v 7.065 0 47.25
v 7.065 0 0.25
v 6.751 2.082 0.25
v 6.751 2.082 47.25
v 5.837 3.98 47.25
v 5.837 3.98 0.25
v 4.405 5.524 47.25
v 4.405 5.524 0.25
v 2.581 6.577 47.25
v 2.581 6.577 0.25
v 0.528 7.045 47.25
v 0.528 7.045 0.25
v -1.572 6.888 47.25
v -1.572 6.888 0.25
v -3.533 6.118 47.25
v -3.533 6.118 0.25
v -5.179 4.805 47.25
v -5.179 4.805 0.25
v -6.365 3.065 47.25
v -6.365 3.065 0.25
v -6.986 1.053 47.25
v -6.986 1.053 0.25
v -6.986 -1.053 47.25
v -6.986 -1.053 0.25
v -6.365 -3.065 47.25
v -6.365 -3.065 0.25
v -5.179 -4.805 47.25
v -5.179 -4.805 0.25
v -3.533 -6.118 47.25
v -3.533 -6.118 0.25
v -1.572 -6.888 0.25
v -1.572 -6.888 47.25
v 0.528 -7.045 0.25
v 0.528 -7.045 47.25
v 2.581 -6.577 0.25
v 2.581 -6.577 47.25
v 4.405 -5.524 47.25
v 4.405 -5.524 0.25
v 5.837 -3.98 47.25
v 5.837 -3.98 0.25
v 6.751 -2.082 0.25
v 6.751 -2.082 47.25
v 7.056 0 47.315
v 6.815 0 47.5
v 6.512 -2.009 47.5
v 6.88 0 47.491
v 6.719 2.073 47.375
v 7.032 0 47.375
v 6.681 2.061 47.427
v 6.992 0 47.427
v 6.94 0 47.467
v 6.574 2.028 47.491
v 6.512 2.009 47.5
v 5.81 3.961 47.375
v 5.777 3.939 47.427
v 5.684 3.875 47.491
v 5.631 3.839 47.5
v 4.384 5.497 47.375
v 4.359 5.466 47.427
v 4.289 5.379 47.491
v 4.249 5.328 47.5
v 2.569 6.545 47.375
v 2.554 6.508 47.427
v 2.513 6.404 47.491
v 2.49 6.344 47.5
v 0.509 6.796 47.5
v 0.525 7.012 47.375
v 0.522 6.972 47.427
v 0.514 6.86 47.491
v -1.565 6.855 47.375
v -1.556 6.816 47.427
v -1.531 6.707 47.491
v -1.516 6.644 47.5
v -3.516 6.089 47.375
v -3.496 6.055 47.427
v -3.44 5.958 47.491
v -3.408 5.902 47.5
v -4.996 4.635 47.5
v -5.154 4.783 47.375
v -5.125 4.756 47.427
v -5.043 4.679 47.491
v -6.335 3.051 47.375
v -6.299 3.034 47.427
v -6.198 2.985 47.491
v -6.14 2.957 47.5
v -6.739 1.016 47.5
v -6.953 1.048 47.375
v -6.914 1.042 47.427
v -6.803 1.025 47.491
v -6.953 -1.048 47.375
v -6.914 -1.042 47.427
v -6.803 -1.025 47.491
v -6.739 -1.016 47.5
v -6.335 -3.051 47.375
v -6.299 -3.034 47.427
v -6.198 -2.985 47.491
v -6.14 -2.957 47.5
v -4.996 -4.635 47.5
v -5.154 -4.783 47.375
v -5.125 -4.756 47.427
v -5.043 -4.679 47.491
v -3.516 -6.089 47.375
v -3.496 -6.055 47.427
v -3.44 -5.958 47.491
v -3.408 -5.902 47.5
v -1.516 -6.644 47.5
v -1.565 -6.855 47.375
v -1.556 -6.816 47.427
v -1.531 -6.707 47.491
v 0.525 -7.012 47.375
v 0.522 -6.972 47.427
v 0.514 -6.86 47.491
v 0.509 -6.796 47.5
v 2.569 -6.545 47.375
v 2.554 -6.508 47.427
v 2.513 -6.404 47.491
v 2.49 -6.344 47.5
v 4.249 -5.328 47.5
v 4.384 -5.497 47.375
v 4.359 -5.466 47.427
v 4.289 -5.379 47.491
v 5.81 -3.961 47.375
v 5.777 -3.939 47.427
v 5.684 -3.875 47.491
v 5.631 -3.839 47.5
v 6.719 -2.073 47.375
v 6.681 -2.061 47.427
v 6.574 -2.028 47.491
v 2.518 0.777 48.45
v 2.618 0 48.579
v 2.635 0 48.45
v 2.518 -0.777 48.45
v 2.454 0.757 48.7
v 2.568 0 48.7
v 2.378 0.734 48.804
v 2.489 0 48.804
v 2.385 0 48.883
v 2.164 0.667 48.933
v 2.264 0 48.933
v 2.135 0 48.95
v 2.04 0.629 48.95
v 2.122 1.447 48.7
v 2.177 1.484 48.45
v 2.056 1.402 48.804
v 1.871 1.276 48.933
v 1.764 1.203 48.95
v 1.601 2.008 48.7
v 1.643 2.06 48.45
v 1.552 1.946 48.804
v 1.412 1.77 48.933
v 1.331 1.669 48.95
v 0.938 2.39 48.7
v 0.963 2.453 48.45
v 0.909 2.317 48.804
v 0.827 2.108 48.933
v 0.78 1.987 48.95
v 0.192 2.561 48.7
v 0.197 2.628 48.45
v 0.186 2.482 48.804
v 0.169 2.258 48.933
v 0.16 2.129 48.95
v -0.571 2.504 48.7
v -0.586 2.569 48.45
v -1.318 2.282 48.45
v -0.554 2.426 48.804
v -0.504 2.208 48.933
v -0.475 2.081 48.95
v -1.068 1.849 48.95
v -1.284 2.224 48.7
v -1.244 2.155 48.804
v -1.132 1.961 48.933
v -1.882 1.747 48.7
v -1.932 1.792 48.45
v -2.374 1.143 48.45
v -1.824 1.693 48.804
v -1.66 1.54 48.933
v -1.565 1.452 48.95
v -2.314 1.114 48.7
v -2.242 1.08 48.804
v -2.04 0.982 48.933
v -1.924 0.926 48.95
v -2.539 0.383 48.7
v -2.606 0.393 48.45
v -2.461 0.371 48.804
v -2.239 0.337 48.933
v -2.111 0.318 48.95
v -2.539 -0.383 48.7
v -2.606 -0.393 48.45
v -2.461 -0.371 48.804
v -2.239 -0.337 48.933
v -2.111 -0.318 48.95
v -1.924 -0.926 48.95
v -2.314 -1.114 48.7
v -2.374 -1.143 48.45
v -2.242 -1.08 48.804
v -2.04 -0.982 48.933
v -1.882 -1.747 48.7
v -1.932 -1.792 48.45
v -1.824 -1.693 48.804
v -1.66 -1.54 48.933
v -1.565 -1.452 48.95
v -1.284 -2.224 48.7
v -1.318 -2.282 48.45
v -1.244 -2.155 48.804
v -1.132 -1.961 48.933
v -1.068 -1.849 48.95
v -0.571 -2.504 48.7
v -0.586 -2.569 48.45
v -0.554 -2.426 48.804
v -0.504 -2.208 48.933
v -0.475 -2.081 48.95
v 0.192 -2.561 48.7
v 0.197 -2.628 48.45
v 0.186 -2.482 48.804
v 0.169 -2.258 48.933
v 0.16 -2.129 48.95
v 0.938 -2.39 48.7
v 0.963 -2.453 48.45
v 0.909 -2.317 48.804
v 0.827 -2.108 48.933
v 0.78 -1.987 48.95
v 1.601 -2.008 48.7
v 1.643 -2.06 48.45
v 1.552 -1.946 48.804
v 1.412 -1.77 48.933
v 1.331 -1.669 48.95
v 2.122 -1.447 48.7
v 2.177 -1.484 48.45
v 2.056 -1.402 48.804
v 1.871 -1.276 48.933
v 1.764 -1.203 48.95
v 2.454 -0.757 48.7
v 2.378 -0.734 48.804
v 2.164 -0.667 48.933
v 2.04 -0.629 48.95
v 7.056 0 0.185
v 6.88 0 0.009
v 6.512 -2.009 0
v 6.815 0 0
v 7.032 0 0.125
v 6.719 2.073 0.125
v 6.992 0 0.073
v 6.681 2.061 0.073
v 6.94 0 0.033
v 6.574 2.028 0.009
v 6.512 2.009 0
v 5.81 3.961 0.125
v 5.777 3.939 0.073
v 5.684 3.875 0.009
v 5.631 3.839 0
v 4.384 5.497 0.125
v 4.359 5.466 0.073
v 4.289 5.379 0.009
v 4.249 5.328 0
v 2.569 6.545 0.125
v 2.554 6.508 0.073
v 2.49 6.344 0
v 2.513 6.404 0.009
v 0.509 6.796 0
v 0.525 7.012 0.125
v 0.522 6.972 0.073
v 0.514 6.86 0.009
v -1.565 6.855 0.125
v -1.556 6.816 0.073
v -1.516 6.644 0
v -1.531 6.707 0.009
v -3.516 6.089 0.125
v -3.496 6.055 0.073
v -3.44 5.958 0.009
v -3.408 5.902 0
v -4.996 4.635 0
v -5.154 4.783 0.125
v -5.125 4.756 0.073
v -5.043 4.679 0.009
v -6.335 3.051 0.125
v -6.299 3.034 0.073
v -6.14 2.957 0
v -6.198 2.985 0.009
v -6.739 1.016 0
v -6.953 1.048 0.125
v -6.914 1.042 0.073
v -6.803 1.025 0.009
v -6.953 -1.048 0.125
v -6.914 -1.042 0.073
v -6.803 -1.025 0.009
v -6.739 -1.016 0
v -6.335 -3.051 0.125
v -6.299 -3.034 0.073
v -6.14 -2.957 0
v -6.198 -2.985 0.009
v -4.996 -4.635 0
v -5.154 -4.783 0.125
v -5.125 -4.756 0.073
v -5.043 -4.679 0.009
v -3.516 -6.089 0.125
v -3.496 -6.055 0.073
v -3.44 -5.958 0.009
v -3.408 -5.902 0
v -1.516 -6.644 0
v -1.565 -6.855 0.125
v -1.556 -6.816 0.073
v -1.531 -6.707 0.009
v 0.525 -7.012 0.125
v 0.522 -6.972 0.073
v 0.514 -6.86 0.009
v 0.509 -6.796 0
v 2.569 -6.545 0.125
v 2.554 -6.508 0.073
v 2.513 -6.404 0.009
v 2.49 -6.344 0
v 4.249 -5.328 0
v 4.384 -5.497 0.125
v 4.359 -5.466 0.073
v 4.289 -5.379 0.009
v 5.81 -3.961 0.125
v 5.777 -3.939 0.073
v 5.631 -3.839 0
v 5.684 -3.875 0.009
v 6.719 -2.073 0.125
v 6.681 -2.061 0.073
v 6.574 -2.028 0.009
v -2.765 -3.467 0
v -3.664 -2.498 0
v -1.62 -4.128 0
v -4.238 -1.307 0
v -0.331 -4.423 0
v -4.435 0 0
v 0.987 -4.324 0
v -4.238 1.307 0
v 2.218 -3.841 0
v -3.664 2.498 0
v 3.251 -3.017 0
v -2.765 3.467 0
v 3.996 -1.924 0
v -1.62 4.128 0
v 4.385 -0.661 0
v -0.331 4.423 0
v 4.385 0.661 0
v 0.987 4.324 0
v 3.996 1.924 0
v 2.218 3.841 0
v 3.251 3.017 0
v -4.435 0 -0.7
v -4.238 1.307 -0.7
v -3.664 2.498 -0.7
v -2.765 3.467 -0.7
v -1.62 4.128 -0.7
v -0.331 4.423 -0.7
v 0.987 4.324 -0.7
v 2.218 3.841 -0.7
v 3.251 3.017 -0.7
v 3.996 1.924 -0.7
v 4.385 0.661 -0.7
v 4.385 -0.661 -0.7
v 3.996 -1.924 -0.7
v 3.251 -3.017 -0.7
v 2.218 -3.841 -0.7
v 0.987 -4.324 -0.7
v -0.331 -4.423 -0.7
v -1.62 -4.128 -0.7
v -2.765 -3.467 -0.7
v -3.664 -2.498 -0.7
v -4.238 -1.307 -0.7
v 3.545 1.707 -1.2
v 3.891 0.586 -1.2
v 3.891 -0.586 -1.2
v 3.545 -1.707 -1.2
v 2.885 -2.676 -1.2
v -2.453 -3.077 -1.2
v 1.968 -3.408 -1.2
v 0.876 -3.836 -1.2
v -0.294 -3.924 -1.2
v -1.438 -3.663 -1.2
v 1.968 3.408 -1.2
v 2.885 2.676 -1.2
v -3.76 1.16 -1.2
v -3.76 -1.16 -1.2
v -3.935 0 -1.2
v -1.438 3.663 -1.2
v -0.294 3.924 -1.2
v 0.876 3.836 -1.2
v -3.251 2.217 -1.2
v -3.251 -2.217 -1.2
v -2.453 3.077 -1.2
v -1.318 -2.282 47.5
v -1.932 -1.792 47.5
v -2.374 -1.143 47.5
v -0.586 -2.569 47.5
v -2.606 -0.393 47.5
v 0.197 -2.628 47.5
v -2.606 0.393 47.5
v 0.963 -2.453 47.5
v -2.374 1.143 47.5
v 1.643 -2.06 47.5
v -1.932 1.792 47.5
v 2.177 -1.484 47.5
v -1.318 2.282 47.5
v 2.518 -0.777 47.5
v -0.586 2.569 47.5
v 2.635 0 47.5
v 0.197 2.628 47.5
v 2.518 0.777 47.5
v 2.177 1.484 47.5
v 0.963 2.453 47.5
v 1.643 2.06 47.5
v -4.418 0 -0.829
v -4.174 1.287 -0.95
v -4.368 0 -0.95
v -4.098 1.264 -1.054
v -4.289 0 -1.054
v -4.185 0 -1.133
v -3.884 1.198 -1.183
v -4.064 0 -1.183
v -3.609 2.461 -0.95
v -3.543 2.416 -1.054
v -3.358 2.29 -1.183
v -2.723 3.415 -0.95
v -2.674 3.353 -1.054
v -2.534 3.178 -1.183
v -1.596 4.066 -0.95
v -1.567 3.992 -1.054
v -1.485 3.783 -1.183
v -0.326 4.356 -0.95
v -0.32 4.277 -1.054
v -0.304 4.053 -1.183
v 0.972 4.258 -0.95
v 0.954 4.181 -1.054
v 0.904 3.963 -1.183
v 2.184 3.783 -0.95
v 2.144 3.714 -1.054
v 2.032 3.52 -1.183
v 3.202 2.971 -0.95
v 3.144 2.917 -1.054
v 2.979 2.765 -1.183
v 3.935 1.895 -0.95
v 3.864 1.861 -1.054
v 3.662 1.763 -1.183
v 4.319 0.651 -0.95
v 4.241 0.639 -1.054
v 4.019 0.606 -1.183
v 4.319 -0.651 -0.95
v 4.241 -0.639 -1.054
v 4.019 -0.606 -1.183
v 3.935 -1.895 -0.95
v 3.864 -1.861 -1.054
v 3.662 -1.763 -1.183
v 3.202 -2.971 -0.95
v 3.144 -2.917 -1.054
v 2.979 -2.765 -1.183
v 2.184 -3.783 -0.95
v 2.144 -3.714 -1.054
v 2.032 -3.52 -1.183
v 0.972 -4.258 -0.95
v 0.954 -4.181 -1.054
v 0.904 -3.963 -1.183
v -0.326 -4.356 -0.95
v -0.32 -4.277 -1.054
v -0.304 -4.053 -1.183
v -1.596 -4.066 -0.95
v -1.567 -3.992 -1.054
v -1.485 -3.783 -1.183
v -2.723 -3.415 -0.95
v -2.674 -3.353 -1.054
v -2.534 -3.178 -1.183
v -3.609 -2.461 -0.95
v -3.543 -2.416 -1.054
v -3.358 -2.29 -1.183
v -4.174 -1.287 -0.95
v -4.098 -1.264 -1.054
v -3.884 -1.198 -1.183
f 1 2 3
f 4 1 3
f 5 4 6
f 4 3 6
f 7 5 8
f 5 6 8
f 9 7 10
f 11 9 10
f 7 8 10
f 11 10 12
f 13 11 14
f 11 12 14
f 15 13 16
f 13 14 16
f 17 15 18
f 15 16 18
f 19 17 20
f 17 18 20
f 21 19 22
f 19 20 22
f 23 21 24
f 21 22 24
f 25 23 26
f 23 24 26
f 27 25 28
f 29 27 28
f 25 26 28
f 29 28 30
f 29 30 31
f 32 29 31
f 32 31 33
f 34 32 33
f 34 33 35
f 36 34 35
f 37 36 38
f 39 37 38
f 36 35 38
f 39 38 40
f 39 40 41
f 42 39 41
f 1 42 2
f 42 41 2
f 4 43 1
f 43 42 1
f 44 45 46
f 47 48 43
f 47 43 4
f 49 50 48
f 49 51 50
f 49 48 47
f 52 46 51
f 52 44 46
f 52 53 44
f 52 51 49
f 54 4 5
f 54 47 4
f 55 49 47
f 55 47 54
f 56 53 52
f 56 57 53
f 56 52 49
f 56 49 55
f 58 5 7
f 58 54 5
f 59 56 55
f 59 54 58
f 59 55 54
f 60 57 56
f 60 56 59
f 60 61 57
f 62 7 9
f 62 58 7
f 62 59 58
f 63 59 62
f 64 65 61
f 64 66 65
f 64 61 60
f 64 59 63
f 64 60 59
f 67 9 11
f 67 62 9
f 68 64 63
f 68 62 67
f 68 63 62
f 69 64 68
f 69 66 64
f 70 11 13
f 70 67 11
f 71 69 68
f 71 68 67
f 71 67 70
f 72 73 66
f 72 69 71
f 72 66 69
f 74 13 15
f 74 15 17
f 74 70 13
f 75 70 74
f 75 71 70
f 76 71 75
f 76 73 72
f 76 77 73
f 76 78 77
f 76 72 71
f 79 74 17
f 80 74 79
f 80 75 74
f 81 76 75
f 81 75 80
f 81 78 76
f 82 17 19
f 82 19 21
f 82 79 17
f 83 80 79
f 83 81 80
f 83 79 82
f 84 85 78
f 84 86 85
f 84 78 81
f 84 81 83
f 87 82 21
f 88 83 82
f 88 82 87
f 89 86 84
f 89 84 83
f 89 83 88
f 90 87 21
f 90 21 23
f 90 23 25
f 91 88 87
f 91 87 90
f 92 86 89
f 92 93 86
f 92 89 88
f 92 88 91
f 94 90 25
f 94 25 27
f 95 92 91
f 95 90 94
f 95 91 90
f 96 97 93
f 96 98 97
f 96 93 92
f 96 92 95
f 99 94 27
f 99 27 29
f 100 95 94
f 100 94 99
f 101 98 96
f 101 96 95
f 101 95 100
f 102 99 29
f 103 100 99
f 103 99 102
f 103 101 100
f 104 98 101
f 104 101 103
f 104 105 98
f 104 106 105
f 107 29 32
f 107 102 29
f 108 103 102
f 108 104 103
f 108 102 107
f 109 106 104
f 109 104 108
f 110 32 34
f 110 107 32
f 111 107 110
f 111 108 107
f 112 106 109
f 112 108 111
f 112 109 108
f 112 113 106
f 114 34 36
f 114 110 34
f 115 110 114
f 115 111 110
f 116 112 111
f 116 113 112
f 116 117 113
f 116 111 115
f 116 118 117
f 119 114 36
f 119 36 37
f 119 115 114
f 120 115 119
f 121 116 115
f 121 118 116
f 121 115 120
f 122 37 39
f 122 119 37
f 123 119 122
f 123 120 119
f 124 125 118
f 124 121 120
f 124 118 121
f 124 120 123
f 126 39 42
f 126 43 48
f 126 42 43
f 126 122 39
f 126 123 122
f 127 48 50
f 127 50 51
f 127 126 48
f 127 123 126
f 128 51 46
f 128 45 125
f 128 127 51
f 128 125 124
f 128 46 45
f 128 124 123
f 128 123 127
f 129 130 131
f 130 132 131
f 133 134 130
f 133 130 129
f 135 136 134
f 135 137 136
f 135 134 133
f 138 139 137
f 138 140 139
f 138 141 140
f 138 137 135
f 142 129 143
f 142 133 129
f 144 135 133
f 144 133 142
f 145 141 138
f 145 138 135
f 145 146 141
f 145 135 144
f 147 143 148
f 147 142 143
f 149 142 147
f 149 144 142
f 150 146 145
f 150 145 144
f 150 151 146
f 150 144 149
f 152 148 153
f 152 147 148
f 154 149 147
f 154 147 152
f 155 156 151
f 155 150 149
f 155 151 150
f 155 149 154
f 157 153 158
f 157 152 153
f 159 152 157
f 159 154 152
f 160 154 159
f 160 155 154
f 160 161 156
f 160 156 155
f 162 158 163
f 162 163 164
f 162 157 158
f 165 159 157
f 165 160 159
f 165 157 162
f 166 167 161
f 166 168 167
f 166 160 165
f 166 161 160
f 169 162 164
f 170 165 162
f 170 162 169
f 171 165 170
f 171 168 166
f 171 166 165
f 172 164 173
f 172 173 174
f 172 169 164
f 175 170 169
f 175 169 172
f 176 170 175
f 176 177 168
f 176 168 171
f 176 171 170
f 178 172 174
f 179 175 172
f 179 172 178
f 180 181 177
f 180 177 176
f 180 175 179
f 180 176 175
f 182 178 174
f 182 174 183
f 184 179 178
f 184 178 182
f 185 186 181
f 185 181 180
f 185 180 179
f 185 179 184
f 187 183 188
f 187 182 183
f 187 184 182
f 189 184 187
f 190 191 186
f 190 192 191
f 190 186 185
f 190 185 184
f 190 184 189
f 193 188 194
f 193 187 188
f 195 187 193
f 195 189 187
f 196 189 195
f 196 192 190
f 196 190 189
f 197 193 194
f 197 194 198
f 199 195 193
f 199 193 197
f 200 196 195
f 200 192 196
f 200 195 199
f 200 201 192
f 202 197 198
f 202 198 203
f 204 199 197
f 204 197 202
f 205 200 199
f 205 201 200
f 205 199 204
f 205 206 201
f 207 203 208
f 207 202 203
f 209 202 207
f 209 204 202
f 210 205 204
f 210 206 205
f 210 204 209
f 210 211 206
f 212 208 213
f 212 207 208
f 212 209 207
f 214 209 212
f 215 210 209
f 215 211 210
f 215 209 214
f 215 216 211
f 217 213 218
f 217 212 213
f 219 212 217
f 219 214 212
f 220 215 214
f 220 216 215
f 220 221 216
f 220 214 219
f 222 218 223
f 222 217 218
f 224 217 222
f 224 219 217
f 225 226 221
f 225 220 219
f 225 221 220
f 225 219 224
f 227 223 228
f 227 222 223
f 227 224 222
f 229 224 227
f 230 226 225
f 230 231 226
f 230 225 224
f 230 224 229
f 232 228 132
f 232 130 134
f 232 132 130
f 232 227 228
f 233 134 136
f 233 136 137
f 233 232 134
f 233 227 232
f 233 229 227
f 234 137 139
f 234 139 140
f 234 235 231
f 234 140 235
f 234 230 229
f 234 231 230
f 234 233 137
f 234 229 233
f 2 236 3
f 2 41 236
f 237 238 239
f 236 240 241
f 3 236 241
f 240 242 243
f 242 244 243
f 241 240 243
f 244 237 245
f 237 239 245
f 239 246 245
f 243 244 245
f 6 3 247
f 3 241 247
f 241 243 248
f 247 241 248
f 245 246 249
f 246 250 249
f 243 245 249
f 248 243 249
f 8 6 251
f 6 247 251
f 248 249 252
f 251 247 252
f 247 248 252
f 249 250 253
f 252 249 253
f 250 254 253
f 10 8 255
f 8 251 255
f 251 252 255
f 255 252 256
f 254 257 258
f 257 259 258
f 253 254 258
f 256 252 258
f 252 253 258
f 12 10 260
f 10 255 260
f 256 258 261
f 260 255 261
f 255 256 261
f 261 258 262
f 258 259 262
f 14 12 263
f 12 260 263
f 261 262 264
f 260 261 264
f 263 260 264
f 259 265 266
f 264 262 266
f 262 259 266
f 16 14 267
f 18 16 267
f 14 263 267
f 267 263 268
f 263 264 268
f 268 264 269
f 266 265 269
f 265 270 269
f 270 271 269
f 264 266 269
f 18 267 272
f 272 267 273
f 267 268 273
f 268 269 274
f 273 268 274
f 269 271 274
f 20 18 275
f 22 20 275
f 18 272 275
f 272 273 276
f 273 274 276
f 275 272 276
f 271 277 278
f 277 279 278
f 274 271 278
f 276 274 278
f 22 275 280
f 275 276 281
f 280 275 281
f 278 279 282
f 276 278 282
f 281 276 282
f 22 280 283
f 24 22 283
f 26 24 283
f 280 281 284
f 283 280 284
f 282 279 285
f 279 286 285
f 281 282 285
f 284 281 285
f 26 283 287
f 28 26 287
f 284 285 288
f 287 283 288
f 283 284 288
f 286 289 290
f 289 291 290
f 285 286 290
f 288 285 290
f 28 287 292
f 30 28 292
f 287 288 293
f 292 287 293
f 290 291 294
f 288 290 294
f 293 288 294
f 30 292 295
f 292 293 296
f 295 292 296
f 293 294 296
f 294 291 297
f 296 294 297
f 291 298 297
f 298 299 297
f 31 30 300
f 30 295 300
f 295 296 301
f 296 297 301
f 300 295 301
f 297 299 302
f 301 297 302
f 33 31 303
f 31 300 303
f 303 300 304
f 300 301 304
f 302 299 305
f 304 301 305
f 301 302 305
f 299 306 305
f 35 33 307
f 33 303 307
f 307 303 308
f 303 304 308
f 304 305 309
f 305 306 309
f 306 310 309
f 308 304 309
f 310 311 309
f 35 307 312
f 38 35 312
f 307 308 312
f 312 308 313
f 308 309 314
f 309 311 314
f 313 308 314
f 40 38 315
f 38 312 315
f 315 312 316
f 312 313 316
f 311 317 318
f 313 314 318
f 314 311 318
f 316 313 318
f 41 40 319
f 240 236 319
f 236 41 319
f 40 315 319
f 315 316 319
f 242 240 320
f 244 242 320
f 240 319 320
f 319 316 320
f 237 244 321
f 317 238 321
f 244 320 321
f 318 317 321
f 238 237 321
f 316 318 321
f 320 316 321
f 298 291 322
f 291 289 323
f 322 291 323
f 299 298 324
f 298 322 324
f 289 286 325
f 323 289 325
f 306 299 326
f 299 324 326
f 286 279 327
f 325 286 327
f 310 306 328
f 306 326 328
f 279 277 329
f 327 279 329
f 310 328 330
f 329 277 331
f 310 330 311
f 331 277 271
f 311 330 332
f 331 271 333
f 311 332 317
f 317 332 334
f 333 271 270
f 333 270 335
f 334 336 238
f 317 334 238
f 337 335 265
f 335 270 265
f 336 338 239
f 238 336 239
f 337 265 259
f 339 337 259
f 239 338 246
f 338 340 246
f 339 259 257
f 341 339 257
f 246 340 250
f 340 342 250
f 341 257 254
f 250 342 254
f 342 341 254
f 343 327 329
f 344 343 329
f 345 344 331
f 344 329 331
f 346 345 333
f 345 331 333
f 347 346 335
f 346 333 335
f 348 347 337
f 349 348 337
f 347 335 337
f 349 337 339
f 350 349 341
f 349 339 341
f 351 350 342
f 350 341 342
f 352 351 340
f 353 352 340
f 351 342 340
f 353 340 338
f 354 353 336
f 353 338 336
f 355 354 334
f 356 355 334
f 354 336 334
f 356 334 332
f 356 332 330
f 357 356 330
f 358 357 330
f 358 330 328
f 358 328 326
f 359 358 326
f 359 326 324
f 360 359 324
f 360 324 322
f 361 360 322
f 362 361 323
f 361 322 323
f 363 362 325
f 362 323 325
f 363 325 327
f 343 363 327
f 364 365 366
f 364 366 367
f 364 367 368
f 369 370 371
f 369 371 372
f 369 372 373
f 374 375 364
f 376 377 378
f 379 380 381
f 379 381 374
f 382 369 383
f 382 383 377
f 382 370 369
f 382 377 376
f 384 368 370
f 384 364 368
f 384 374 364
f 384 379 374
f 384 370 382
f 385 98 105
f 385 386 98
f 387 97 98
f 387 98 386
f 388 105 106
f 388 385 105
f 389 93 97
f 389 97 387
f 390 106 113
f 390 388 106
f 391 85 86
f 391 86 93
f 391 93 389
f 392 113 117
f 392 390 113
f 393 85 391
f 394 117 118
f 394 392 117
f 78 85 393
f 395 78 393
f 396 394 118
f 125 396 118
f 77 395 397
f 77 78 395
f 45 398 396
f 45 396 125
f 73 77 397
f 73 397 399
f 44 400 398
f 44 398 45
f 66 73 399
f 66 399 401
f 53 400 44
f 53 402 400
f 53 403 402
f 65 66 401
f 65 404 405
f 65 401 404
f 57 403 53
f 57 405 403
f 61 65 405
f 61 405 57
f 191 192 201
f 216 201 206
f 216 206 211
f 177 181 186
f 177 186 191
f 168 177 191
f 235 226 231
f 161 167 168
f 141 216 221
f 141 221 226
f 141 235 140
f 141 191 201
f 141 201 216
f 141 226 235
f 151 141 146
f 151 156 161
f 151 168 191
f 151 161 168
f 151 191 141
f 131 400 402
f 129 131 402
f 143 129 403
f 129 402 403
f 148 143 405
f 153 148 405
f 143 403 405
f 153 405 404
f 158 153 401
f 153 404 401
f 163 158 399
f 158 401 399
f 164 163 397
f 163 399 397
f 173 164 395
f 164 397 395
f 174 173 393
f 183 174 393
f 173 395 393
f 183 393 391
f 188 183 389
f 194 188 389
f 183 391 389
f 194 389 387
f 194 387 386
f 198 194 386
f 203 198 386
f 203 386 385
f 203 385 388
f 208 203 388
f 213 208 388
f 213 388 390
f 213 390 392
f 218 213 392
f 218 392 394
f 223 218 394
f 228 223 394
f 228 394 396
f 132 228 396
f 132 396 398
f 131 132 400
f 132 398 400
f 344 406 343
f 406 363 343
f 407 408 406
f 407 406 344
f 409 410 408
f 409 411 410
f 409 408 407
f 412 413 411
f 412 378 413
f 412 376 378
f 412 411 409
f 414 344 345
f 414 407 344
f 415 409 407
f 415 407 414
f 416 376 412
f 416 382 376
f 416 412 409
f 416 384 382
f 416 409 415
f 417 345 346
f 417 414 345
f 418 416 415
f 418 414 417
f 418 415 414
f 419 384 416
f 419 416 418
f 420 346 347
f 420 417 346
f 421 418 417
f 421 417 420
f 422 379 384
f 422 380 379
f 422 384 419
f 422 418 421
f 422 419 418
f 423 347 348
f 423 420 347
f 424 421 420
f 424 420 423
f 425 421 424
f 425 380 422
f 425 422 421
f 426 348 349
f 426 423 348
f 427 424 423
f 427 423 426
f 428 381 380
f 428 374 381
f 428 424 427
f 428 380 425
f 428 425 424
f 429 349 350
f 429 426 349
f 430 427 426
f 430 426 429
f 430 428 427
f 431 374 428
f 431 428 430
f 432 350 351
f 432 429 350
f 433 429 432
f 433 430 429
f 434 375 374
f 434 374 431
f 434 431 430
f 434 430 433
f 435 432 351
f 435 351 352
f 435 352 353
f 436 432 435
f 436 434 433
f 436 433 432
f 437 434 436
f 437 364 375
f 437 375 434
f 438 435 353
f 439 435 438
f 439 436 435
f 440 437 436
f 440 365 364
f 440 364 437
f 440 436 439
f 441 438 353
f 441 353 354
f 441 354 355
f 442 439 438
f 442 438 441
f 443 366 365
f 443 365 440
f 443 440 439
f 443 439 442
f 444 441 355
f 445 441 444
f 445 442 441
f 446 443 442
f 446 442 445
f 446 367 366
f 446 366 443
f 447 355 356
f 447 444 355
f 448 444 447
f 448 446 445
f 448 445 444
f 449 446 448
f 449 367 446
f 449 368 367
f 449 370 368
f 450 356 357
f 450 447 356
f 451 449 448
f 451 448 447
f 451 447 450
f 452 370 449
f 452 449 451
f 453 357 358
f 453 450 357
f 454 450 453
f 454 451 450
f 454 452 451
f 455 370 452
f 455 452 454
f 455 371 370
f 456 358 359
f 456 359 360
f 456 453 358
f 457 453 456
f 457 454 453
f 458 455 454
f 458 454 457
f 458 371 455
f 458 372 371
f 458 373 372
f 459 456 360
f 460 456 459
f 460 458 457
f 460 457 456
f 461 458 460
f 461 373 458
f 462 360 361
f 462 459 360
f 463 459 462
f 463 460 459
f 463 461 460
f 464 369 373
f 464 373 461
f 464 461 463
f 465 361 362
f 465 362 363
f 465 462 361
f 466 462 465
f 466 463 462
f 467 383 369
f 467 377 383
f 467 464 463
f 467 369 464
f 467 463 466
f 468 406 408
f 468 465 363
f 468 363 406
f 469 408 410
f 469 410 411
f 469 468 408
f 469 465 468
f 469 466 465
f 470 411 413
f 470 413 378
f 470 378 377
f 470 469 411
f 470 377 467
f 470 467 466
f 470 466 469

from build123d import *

# Parameters (mm, degrees)
SKETCH1_R           = 7.065
BOSS_EXTRUDE1_DEPTH = 47.5
SKETCH2_R           = 2.635
BOSS_EXTRUDE2_DEPTH = 1.45
FILLET2_R           = 0.25
SKETCH3_R           = 4.435
BOSS_EXTRUDE3_DEPTH = 1.2
FILLET1_R           = 0.5


with BuildPart() as part:
    # Sketch1 → Boss-Extrude1 (new body)
    with BuildSketch(Plane.XY):
        Circle(SKETCH1_R)
    extrude(amount=BOSS_EXTRUDE1_DEPTH)

    # Sketch2 → Boss-Extrude2 (add)
    with BuildSketch(Plane.XY.offset(47.5)):
        Circle(SKETCH2_R)
    extrude(amount=BOSS_EXTRUDE2_DEPTH)

    # Fillet2
    fillet2_edges = [part.edges().sort_by_distance(p)[0] for p in [
        (-7.065, 0, 0),
        (-7.065, 0, 47.5),
    ]]
    fillet(fillet2_edges, radius=FILLET2_R)

    # Sketch3 → Boss-Extrude3 (add)
    with BuildSketch(Plane(origin=(0, 0, 0), x_dir=(-1, 0, 0), z_dir=(0, 0, -1))):
        Circle(SKETCH3_R)
    extrude(amount=BOSS_EXTRUDE3_DEPTH)

    # Fillet1
    fillet1_edges = [part.edges().sort_by_distance(p)[0] for p in [
        (4.435, 0, -1.2),
        (-2.635, 0, 48.95),
    ]]
    fillet(fillet1_edges, radius=FILLET1_R)


solid = part.part
